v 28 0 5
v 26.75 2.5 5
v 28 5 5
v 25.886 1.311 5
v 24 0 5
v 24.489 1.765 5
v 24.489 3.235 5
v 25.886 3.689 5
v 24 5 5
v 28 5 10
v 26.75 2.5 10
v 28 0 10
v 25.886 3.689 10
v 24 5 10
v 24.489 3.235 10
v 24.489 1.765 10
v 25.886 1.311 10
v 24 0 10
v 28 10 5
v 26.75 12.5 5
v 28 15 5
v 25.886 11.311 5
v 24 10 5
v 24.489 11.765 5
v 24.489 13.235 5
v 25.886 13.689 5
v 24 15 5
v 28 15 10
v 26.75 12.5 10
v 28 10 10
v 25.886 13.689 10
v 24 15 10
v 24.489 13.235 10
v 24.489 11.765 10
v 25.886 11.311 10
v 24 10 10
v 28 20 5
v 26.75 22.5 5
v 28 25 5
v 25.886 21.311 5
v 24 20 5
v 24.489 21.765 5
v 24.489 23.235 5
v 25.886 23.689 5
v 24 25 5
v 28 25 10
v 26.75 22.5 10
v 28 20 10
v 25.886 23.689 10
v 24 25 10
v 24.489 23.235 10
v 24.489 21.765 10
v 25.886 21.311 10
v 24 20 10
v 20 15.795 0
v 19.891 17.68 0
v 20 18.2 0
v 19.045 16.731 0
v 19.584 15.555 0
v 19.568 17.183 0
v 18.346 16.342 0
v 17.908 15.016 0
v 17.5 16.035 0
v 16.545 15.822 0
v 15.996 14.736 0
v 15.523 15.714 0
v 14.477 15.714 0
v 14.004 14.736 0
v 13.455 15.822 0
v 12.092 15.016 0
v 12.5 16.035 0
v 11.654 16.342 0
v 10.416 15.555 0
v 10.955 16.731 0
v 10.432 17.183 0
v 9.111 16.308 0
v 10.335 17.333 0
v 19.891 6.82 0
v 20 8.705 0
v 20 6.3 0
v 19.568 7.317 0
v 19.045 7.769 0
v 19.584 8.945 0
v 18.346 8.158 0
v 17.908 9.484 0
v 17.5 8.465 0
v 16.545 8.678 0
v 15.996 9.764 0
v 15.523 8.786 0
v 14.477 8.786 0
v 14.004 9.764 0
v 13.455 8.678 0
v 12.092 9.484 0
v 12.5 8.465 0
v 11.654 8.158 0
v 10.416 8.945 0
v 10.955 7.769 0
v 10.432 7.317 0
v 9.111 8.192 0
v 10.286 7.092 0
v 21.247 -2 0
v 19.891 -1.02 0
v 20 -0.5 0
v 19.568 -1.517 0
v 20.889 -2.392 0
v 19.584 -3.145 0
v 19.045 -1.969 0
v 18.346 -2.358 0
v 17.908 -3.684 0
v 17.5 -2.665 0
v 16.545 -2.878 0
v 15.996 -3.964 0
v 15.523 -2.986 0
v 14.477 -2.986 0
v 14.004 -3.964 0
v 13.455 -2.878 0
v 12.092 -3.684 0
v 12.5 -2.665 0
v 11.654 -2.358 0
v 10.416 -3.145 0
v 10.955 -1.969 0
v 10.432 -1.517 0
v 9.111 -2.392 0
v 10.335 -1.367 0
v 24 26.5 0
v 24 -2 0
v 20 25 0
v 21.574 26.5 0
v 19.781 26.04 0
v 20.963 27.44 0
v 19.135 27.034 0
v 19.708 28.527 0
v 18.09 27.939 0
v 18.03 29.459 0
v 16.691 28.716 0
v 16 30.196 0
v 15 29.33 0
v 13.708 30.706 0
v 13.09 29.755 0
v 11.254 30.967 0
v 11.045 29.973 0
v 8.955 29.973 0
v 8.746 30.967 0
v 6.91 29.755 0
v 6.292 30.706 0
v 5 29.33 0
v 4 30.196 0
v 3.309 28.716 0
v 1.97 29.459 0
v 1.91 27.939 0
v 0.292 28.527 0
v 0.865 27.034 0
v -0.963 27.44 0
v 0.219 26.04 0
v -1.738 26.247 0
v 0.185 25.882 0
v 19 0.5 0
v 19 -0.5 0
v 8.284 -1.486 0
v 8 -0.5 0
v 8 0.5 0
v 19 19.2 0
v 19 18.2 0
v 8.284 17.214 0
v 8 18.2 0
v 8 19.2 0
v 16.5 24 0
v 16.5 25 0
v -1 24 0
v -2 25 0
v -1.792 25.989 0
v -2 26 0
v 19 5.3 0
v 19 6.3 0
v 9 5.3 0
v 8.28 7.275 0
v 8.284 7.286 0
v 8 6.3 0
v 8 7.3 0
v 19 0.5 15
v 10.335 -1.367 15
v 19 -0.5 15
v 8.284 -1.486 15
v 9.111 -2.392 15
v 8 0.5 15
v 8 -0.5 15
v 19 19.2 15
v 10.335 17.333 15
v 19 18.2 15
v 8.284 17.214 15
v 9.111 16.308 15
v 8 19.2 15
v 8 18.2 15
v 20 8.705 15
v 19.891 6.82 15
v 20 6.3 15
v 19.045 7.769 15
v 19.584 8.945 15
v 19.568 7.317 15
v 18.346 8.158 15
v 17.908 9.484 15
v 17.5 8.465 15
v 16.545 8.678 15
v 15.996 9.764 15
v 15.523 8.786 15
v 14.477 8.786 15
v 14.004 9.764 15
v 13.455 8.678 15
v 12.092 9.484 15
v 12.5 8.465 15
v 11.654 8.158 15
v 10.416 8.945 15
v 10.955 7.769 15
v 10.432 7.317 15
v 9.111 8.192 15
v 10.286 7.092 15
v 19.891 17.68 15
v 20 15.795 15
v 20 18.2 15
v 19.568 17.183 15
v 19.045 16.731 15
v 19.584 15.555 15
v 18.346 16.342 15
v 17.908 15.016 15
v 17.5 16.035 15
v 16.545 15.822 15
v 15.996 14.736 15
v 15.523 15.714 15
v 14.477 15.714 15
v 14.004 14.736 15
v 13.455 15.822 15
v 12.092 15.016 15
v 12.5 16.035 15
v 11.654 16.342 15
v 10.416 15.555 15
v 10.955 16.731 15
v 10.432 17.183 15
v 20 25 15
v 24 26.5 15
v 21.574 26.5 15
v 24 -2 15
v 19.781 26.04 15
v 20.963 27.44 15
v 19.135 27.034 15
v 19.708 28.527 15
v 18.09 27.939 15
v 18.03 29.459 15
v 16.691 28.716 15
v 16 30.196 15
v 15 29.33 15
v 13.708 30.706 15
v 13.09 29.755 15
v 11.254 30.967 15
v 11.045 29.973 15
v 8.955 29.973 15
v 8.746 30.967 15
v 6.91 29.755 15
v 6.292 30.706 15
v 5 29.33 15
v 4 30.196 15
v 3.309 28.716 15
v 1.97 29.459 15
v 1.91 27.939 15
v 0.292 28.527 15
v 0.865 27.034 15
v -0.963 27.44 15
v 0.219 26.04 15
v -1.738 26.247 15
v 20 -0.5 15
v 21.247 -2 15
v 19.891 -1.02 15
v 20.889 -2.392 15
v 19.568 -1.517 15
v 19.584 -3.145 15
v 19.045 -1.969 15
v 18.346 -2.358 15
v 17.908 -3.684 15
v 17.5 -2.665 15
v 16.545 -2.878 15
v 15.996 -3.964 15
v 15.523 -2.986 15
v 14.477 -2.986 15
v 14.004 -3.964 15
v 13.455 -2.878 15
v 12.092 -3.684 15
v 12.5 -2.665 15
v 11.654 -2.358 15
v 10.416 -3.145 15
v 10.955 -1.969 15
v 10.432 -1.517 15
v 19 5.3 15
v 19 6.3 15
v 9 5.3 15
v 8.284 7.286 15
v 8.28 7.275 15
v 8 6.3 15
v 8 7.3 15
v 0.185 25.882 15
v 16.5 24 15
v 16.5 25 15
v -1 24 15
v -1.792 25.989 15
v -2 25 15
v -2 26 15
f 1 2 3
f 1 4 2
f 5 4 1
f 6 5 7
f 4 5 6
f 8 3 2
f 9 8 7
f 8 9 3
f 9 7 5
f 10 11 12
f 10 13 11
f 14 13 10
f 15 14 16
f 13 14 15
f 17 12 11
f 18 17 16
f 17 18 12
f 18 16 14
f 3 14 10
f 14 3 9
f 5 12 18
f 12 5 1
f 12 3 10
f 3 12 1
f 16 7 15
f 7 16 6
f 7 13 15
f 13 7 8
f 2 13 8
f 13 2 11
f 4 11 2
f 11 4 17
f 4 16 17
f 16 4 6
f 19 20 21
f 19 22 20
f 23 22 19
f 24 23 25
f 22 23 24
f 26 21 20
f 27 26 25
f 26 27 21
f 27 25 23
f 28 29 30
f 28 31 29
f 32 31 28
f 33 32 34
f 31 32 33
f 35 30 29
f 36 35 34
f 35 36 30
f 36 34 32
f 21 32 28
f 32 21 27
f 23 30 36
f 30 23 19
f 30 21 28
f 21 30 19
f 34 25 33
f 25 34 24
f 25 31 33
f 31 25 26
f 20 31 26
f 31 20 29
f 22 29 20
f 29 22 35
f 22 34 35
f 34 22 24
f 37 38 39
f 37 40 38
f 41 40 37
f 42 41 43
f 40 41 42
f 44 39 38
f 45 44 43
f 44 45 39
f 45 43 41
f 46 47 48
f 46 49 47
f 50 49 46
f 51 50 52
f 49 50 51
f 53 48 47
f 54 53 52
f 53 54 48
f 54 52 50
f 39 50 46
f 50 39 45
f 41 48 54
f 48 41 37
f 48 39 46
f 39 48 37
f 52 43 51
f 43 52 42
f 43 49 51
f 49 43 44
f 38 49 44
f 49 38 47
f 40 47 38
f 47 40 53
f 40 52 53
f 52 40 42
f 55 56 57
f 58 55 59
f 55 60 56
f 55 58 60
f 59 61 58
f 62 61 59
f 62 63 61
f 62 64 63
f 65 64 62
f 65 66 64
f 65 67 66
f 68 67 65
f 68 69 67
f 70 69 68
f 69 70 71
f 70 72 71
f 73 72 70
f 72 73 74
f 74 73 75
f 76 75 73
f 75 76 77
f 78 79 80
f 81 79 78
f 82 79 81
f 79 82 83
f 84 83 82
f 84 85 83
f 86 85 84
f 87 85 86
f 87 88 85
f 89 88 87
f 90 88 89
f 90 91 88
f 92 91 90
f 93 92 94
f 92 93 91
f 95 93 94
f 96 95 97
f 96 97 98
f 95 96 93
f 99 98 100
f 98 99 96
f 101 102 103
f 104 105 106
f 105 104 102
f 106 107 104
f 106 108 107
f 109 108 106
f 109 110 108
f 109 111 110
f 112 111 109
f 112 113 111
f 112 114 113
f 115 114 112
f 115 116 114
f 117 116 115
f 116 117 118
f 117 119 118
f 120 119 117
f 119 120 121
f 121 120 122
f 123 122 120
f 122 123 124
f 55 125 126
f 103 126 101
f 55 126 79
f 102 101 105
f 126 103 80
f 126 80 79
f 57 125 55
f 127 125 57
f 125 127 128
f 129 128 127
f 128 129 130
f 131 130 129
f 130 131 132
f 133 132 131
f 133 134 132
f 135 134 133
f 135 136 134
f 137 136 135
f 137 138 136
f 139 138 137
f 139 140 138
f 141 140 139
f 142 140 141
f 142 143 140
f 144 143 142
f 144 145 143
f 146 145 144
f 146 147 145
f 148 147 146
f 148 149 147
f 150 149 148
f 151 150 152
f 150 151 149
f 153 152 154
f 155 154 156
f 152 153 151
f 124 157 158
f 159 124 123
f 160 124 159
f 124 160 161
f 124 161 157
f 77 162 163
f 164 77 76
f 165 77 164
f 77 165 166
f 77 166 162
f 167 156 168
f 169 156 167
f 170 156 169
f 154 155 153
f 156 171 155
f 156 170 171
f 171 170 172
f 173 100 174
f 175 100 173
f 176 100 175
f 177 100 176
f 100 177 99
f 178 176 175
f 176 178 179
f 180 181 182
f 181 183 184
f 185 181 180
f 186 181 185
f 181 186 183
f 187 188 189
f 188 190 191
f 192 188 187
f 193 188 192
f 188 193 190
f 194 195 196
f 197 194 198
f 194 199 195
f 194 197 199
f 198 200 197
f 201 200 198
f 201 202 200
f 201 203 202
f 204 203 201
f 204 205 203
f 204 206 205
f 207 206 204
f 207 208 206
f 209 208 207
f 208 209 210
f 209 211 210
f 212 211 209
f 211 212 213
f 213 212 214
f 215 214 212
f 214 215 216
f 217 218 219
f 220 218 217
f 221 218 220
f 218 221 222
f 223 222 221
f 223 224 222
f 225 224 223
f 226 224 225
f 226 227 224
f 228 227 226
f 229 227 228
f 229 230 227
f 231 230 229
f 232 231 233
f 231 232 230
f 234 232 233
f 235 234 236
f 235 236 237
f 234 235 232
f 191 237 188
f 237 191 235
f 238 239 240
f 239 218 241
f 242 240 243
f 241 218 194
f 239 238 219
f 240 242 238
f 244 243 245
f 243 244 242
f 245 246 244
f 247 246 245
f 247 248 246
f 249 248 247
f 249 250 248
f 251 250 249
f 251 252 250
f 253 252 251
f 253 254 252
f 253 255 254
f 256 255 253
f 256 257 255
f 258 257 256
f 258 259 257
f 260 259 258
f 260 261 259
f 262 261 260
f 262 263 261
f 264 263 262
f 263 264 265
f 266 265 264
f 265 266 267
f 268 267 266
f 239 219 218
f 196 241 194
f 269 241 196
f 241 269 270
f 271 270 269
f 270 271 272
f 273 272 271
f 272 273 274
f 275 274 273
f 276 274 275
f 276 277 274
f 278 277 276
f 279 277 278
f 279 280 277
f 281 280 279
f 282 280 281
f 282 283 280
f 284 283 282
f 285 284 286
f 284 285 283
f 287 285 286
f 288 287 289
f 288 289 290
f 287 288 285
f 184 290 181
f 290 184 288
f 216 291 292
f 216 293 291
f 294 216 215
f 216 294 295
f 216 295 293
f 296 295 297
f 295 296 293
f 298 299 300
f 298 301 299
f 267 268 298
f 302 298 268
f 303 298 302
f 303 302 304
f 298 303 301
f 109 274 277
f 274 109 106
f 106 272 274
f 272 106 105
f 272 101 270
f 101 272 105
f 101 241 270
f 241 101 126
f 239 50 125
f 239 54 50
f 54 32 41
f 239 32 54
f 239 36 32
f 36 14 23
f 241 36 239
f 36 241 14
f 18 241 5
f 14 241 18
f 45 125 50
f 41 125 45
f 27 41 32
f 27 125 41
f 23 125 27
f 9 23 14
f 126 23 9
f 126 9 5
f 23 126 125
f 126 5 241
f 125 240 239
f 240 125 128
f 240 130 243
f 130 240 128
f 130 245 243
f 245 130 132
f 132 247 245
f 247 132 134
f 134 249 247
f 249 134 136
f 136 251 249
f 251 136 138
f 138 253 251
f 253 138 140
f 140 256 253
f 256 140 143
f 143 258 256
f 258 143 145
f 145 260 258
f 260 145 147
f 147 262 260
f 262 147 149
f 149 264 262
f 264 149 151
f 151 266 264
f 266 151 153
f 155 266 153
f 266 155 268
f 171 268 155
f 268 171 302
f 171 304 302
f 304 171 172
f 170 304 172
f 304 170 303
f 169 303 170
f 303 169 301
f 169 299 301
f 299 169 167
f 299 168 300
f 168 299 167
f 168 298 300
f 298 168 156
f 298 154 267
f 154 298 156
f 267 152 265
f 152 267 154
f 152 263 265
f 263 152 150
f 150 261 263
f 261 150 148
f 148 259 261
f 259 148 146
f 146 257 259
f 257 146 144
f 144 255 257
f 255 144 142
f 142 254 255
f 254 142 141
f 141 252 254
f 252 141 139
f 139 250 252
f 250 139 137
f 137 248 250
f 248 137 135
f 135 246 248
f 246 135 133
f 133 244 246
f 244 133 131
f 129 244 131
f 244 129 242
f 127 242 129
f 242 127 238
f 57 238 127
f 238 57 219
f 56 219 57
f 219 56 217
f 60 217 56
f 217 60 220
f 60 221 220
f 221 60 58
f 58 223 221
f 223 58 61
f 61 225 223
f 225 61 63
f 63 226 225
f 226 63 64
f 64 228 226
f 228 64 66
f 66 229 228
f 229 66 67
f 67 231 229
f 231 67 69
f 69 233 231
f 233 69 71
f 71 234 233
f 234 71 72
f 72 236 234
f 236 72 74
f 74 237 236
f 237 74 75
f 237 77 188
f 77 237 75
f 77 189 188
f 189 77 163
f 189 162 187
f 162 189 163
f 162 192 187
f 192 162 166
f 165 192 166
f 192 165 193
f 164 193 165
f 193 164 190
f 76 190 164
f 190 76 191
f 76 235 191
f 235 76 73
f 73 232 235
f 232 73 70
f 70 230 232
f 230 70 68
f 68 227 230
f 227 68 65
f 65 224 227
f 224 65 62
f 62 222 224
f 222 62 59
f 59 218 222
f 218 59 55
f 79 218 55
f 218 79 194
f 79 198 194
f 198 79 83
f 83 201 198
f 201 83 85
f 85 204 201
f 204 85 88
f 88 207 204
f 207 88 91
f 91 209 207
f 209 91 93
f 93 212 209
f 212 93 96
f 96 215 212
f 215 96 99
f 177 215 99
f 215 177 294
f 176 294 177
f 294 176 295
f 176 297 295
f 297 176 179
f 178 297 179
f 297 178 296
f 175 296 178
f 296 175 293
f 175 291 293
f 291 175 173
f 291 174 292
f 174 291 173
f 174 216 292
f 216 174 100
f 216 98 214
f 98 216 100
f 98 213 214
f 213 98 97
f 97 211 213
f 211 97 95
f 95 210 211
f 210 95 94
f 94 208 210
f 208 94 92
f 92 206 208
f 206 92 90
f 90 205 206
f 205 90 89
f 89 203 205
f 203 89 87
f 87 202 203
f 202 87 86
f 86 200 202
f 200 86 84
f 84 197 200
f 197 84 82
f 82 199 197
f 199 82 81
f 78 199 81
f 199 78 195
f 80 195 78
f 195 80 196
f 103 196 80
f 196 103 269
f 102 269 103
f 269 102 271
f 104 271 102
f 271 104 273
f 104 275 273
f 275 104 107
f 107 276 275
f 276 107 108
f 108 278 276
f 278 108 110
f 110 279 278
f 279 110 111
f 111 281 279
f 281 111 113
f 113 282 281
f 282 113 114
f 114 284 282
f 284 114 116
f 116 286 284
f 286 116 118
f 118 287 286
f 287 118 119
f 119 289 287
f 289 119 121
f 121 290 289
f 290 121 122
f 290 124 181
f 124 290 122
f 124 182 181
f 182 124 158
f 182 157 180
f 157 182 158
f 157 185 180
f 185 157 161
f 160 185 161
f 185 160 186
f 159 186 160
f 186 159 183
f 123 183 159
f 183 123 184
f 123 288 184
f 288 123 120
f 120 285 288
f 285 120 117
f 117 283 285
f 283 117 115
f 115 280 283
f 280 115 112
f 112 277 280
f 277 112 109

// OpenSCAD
//
//  Copyright (C) 21-04-2013 Jasper den Ouden.(ojasper.nl)
//
//  This is free software: you can redistribute it and/or modify
//  it under the terms of the GNU General Public License as published
//  by the Free Software Foundation, either version 3 of the License, or
//  (at your option) any later version.
//

//include <attachable.scad>

al = 5;

h = 24.5; 
pt = 5.8; //Note the top one seems a littl less.

st =4; //Structural thicknesses.

td = 10; //Length grabbed..
bd = 20;

t=2; //Thickness of springy bits.

w = al; //Width.
dev = 0.5; //Deviation for beding.


module springy(l,gy,dir)
{
    y = gy + dir*dev;
    translate([bd-l,y]) 
    {   polygon([[-t/2,0], [-t,t/2],[-t,t], [3*(l+t)/4,dir>0 ? t : t/2], 
                 [3*(l+t)/4,dir>0 ? t/2 : 0]]);
        translate([l/2,t/2]) scale([1,dir]) difference()
        {   scale([1,1/2]) circle(l/2+t);
            scale([(l/2)/l,(l/4)/l]) circle(l);
            translate([0,l]) square(2*[l,l],center=true);
        }
    }
}

module clamp_profile()
{   springy(td,-t,+1);
    springy(td,pt,-1);
    springy(td,h-pt-t,+1);
    springy(bd,h,-1);

    translate([bd,-t]) square([st,h+2*t]);
}

module clamp()
{   linear_extrude(height=w) clamp_profile(); }

module clamp_component()
{   linear_extrude(height = 3*al) clamp_profile();
    for( y = [0 : 2*al :h] ) 
        translate([bd-t+al,y,al]) 
            linear_extrude(height=al) difference()
        {  square([al,al]); translate(al*[1,1]/2) circle(al/4); }
}

clamp_component();

module clamp_to_visualization()
{   color([0,0,1]) 
    {   translate([bd-td-t,0]) square([td,pt]);
        translate([-t,h-pt])  square([bd,pt]);
    }
}
clamp_to_visualization();
